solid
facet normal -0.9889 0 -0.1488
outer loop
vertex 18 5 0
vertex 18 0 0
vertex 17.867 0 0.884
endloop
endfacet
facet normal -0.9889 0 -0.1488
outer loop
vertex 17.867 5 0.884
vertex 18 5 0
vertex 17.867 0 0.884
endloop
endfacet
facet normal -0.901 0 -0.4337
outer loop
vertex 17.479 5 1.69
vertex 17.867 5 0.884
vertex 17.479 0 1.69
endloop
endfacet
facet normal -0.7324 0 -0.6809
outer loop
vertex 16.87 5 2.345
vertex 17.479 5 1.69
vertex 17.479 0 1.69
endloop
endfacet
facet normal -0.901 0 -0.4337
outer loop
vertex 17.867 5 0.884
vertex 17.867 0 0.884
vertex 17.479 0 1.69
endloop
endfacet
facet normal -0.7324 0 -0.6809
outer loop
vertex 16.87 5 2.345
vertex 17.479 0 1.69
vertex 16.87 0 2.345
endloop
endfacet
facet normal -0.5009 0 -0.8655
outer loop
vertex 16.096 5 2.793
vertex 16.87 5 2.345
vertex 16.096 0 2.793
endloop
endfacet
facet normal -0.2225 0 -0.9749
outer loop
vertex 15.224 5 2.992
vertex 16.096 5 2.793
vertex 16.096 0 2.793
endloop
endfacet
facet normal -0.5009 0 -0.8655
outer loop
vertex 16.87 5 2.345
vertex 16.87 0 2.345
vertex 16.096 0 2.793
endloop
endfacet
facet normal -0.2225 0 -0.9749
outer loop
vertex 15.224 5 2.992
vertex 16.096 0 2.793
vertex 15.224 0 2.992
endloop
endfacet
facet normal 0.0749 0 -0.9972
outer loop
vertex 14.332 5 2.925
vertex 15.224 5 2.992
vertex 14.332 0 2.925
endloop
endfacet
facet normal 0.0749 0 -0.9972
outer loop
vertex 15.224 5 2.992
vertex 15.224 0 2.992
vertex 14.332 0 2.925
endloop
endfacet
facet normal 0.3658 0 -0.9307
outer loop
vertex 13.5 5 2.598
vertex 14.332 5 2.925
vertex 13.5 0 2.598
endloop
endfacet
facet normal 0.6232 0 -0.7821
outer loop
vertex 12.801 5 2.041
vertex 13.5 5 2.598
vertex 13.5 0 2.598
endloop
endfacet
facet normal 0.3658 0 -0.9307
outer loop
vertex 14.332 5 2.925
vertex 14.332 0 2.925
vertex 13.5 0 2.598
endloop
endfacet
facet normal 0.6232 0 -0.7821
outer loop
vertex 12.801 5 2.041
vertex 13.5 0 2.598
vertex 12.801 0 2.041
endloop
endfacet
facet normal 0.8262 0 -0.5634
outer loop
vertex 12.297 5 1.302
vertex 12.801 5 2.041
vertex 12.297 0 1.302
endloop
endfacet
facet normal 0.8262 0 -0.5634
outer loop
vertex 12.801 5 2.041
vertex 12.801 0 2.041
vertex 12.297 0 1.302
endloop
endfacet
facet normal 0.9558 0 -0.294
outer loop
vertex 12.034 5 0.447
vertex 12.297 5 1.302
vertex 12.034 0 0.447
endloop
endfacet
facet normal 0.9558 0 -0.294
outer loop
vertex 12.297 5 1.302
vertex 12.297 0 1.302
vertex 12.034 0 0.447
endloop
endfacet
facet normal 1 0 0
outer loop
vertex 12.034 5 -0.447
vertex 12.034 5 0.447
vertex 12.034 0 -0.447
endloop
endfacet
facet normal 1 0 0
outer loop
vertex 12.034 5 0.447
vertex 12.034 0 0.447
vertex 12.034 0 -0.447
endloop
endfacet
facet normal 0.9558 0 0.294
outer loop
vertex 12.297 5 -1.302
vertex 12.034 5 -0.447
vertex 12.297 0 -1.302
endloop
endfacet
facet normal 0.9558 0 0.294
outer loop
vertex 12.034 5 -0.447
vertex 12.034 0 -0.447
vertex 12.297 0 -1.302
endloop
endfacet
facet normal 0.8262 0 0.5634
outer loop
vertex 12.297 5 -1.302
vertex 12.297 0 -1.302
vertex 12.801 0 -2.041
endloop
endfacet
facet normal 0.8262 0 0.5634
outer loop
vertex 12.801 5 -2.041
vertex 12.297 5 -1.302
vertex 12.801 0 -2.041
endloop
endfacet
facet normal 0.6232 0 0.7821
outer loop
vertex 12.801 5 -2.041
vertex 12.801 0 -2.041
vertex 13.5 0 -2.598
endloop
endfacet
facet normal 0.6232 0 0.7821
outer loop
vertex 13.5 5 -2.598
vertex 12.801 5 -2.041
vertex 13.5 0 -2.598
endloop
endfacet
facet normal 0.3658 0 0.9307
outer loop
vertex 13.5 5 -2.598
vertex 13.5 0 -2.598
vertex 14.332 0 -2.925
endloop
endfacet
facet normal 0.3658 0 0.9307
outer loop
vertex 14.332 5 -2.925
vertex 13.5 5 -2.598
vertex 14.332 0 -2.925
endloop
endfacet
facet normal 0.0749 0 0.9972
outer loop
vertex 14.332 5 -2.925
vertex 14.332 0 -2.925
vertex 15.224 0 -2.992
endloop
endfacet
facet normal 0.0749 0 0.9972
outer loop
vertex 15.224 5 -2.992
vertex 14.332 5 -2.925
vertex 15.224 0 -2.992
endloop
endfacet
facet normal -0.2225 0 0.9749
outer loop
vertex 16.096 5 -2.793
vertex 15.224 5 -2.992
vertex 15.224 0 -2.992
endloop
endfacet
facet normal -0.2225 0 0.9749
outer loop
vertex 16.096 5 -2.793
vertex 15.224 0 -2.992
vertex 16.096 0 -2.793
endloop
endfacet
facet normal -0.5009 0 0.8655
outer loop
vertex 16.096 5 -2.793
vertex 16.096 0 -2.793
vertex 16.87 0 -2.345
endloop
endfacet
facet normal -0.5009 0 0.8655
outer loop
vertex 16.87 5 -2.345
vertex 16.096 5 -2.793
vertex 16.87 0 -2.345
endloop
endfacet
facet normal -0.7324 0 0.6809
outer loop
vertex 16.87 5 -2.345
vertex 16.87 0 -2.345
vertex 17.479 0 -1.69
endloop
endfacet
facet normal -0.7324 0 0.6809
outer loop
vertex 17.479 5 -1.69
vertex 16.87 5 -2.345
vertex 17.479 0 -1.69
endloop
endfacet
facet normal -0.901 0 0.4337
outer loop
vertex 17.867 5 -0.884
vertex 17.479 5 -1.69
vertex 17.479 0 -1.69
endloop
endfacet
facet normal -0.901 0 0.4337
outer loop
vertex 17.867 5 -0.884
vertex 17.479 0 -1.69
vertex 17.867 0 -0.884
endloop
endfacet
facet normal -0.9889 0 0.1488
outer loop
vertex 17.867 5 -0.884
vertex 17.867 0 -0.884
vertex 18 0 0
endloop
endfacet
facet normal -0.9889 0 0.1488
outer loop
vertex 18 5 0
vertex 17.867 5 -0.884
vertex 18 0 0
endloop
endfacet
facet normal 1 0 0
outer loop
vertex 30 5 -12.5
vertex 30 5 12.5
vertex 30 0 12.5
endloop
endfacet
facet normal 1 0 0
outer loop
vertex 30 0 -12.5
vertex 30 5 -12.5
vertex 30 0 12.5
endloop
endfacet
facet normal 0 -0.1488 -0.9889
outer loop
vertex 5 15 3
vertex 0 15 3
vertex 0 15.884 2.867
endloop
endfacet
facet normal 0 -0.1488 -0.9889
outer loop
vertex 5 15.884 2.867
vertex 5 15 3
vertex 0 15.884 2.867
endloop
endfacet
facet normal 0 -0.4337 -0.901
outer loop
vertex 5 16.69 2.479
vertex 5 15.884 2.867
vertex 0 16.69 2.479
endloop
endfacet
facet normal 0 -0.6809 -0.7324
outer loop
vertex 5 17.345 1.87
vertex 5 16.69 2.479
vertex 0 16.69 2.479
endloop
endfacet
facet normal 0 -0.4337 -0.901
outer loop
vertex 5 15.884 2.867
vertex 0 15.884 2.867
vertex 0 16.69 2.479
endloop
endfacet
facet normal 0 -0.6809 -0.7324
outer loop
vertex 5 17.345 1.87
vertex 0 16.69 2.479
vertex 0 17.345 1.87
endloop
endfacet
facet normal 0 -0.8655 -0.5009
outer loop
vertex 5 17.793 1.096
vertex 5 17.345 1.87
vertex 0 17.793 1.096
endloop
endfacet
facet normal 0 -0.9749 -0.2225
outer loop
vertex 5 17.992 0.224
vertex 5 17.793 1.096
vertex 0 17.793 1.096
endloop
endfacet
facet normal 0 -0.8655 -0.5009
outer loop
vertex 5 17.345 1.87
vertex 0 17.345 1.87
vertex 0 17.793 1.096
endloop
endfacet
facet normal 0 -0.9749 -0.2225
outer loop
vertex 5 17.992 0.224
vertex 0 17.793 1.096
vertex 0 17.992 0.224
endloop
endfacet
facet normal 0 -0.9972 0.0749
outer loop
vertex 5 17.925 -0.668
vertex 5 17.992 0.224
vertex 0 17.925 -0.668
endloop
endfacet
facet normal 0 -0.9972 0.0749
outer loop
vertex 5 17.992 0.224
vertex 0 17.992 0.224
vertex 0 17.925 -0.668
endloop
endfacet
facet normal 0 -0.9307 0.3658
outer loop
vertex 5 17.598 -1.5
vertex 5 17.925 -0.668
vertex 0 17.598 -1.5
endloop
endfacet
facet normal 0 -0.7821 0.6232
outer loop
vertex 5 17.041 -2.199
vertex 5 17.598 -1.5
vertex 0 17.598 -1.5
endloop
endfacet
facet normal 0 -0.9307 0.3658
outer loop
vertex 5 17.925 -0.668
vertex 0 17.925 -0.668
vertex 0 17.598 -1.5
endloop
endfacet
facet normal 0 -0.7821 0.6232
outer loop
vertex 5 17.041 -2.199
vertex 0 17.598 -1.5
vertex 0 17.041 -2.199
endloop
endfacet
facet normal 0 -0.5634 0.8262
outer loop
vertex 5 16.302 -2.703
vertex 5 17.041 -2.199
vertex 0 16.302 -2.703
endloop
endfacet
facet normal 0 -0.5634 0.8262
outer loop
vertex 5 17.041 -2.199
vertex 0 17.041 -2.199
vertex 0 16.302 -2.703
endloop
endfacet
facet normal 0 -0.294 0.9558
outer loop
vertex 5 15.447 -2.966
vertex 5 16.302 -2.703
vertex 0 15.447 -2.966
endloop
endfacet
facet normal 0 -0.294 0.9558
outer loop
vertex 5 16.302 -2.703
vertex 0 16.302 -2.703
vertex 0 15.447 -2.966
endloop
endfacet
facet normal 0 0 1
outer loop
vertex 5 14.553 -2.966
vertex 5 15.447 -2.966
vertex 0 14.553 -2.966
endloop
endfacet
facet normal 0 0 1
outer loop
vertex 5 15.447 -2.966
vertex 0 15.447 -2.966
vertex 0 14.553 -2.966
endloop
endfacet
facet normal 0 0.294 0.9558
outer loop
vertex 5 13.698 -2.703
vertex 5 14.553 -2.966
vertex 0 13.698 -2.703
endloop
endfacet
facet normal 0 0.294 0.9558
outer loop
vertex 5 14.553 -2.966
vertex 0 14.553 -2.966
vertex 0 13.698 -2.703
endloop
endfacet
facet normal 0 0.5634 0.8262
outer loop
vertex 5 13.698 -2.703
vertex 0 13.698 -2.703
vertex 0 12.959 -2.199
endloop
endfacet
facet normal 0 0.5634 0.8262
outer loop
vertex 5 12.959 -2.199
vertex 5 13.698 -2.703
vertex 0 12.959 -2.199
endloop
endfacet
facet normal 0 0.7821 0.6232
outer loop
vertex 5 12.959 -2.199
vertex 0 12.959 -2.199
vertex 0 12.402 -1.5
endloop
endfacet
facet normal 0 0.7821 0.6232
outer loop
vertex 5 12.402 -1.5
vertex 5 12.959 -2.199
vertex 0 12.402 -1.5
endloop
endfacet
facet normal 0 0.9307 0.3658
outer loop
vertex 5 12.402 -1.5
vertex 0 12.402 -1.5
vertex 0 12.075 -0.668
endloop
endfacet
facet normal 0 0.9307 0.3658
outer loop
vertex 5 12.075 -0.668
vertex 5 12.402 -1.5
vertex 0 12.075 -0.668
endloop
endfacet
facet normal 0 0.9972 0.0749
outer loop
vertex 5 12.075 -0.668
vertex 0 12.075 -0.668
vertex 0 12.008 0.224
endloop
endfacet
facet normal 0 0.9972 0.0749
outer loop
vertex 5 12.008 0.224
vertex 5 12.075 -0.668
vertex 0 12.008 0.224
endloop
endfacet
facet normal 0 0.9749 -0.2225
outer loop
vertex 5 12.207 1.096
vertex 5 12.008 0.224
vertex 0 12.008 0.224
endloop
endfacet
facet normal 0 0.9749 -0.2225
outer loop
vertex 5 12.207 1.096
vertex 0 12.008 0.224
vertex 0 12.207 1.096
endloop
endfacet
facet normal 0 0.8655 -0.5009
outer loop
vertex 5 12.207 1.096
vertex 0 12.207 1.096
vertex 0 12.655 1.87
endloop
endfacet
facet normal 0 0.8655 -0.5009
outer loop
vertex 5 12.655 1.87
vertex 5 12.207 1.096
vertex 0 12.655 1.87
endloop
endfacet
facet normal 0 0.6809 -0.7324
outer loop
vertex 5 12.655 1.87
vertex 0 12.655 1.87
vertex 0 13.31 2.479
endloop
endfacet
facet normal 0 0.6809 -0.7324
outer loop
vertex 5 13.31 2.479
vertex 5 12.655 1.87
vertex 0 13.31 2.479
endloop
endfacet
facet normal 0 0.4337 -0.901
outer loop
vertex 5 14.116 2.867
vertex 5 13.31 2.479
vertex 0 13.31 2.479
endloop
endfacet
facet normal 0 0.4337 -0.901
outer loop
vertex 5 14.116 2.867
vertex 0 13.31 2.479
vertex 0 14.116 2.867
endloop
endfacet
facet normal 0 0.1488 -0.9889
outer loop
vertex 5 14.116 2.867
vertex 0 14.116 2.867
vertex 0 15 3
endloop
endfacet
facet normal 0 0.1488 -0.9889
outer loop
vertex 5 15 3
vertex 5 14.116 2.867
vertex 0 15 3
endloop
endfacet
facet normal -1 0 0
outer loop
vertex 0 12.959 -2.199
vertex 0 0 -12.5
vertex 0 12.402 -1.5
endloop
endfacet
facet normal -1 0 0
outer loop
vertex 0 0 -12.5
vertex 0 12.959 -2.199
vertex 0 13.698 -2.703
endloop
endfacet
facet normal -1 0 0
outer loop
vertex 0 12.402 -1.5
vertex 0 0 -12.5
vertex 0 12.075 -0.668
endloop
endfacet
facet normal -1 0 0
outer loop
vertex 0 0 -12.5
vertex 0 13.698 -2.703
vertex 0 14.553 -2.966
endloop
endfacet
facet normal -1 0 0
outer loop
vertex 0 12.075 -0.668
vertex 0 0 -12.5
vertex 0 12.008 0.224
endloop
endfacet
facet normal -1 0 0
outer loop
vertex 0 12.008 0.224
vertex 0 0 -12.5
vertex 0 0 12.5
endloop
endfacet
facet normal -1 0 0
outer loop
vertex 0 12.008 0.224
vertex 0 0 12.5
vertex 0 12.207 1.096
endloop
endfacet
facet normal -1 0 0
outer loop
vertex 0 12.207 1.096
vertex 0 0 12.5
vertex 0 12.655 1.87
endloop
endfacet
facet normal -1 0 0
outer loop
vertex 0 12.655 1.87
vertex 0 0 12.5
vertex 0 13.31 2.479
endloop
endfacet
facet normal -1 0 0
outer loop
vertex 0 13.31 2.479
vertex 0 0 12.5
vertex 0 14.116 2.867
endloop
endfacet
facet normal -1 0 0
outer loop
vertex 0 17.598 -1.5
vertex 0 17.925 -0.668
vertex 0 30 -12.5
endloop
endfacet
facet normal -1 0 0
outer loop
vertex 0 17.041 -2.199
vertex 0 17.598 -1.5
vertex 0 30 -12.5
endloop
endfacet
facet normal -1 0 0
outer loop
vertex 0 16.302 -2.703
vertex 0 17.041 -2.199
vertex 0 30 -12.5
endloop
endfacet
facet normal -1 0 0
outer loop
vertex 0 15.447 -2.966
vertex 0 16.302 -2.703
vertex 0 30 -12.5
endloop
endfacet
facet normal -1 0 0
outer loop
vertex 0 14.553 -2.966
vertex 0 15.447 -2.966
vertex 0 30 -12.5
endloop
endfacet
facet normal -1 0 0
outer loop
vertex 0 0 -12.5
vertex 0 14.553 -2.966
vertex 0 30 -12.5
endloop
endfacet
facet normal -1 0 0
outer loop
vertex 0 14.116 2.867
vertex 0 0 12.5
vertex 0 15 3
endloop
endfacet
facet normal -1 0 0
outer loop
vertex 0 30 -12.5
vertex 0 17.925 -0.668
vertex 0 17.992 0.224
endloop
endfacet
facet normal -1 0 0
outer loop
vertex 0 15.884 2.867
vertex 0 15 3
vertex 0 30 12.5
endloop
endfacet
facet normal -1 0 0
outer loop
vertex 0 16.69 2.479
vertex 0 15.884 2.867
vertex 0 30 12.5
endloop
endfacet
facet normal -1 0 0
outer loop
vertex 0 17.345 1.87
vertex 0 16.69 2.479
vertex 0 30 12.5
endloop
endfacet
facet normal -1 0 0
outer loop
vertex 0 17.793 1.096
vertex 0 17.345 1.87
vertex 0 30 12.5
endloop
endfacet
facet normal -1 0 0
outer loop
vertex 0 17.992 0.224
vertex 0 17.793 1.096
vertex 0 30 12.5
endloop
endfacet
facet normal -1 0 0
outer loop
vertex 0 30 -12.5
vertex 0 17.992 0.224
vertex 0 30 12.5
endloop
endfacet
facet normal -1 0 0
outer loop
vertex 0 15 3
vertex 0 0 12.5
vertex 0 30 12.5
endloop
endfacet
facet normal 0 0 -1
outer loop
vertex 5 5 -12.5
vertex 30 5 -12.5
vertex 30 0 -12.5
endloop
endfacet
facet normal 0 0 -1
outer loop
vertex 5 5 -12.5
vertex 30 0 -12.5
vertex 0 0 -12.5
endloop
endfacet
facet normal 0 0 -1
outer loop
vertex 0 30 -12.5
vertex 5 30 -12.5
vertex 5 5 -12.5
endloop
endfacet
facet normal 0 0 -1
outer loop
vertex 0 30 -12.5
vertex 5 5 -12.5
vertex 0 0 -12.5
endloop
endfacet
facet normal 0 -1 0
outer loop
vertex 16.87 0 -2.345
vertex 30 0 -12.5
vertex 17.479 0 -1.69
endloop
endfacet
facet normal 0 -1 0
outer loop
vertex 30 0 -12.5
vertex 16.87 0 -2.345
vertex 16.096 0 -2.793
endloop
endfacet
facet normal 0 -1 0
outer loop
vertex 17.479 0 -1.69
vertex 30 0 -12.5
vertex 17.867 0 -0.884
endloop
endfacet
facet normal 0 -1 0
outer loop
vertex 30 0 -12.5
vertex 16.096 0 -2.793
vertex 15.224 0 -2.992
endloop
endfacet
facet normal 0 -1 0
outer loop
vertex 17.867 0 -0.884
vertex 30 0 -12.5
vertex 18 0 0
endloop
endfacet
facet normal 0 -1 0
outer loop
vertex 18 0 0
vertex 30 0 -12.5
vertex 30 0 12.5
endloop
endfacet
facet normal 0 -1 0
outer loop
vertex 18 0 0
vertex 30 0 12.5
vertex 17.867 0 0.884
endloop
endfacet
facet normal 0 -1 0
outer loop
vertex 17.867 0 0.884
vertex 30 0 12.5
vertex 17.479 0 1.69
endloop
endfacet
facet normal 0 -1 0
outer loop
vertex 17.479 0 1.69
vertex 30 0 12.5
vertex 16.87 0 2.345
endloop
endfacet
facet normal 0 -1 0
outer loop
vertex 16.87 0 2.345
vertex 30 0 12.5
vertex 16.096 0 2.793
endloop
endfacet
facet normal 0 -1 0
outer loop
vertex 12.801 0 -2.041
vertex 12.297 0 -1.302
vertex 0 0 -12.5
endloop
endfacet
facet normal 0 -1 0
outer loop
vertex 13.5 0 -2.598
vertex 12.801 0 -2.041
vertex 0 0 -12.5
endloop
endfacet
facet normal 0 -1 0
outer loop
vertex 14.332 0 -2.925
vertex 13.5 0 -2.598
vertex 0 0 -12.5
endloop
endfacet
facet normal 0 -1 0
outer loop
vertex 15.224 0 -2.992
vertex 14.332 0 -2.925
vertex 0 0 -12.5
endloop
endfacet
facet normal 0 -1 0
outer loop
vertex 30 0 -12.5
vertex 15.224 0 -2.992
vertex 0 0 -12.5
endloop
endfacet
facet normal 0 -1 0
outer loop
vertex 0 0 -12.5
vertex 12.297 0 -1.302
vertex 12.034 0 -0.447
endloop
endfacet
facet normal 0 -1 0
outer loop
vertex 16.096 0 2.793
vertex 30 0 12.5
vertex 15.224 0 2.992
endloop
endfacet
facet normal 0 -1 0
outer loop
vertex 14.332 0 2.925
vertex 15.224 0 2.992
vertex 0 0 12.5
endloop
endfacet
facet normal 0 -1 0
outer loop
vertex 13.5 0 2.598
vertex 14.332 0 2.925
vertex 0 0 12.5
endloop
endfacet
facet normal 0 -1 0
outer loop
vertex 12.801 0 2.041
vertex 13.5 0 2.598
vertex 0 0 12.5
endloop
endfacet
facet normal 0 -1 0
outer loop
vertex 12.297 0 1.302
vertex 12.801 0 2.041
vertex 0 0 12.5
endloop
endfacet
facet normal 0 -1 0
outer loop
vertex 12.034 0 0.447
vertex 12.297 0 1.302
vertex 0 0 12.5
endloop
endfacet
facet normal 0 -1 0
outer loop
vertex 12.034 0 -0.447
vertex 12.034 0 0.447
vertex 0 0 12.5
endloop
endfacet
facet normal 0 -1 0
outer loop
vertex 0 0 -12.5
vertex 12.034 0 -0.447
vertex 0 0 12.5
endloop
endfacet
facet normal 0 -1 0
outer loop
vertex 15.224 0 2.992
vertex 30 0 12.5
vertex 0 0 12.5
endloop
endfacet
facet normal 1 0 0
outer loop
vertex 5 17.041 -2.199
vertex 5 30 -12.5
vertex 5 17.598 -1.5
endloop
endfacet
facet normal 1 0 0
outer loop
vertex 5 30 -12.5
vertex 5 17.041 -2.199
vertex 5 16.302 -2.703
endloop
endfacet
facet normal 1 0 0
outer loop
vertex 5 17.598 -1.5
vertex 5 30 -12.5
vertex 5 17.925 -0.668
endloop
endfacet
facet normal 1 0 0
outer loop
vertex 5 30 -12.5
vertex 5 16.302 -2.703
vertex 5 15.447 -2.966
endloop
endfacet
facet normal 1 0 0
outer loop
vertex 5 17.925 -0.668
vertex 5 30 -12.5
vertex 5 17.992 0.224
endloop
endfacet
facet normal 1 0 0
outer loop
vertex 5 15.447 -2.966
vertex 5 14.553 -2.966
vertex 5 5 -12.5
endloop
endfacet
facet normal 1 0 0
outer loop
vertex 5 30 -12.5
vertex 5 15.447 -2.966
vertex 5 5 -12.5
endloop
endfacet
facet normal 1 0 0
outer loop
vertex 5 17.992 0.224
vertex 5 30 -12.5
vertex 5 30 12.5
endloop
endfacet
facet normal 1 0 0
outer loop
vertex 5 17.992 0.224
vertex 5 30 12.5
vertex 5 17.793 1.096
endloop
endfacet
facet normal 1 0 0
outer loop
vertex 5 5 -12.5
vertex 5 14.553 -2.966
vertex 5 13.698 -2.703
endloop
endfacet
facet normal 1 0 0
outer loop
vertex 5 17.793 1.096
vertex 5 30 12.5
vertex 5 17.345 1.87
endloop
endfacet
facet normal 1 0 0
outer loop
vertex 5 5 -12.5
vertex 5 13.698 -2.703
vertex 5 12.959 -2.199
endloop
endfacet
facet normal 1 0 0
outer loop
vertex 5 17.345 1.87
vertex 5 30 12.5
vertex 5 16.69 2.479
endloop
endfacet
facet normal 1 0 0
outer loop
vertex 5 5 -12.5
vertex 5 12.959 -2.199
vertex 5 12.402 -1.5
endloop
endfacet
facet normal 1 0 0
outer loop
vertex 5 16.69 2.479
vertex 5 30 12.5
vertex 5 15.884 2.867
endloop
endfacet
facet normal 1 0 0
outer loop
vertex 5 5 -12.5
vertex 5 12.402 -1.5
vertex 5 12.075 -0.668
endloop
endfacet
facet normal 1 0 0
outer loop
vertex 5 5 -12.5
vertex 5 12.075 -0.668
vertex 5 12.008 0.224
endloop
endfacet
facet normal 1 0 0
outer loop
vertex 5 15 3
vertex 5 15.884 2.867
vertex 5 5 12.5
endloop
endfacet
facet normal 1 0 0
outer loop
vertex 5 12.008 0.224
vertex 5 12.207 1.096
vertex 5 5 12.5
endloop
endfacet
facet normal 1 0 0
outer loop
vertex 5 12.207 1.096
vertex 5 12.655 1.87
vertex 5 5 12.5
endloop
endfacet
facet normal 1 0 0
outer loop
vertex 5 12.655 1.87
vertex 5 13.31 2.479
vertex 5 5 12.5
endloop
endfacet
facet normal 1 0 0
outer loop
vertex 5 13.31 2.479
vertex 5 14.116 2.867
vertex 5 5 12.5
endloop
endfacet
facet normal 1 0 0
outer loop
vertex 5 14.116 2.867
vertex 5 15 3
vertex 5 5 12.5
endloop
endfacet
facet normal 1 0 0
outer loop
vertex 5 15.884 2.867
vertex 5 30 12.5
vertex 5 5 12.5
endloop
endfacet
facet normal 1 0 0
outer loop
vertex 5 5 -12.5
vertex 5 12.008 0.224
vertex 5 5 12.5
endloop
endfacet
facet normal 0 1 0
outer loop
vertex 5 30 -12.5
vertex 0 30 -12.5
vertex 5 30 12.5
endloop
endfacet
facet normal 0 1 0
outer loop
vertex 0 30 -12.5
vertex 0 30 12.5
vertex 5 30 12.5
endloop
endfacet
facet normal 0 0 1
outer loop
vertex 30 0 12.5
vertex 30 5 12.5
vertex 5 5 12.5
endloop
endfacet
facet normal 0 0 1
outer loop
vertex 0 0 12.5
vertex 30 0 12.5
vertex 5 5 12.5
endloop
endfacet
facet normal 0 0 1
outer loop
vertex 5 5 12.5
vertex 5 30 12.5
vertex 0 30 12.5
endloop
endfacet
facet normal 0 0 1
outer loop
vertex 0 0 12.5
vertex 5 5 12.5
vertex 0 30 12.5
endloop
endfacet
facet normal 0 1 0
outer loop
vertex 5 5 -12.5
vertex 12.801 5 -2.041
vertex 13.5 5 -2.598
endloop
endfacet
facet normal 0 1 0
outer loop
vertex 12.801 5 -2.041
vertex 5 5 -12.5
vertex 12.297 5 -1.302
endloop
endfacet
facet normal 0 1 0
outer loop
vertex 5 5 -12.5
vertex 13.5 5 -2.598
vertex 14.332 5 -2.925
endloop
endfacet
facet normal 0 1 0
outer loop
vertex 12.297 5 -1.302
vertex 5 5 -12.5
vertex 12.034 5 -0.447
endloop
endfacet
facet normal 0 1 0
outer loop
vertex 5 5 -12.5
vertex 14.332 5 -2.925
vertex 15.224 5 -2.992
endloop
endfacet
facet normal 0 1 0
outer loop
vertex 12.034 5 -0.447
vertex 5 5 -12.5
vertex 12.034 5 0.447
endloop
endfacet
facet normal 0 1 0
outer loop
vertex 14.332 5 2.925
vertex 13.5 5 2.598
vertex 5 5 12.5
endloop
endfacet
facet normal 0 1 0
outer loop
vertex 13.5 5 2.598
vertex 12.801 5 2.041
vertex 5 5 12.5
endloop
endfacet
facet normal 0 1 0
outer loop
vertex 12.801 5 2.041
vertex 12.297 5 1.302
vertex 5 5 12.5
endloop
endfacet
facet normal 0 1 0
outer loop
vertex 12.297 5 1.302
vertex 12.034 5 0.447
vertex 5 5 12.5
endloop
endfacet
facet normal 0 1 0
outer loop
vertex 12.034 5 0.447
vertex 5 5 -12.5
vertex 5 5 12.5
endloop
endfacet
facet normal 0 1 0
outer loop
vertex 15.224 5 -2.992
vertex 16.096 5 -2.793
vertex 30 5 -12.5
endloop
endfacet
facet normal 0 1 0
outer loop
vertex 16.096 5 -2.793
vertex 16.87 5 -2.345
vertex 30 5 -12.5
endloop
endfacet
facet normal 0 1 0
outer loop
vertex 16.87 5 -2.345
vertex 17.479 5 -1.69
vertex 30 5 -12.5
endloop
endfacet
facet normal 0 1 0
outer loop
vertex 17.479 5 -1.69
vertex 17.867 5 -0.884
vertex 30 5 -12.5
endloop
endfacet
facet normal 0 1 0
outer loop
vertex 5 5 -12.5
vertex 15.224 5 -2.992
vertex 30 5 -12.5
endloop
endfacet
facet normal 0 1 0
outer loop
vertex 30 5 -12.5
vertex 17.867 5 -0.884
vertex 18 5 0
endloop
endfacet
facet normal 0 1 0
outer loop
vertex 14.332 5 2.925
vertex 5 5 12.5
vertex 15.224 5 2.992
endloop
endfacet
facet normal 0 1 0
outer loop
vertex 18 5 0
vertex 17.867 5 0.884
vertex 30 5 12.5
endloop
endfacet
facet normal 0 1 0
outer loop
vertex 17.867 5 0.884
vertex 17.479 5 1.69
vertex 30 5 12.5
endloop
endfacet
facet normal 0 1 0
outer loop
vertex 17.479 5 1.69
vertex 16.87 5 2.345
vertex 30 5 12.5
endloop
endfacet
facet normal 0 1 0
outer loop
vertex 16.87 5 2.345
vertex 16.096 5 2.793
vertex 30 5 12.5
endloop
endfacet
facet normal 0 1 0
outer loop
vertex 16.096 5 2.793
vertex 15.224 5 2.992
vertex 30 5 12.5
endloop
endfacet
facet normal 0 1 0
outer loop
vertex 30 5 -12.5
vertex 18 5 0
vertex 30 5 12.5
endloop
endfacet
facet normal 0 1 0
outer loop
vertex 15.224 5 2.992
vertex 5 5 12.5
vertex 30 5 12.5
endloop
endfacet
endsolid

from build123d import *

# Parameters (mm, degrees)
BOSS_EXTRUDE1_DEPTH = 12.5
SKETCH2_R           = 3
CUT_EXTRUDE1_DEPTH  = 45.229515032
SKETCH3_R           = 3
CUT_EXTRUDE2_DEPTH  = 45.229515032


with BuildPart() as part:
    # Sketch1 → Boss-Extrude1 (new, symmetric)
    with BuildSketch(Plane.XY):
        Polygon((0, 0), (0, 30), (5, 30), (5, 5), (30, 5), (30, 0), align=None)
    extrude(amount=BOSS_EXTRUDE1_DEPTH, both=True)

    # Sketch2 → Cut-Extrude1 (cut, through all)
    with BuildSketch(Plane.ZY):
        with Locations((0, 15)):
            Circle(SKETCH2_R)
    extrude(amount=-CUT_EXTRUDE1_DEPTH, mode=Mode.SUBTRACT)

    # Sketch3 → Cut-Extrude2 (cut, through all)
    with BuildSketch(Plane(origin=(0, 0, 0), x_dir=(0, 0, 1), z_dir=(0, -1, 0))):
        with Locations(Location((0, -15, 0), (0, 0, 270))):
            Circle(SKETCH3_R)
    extrude(amount=-CUT_EXTRUDE2_DEPTH, mode=Mode.SUBTRACT)


solid = part.part
